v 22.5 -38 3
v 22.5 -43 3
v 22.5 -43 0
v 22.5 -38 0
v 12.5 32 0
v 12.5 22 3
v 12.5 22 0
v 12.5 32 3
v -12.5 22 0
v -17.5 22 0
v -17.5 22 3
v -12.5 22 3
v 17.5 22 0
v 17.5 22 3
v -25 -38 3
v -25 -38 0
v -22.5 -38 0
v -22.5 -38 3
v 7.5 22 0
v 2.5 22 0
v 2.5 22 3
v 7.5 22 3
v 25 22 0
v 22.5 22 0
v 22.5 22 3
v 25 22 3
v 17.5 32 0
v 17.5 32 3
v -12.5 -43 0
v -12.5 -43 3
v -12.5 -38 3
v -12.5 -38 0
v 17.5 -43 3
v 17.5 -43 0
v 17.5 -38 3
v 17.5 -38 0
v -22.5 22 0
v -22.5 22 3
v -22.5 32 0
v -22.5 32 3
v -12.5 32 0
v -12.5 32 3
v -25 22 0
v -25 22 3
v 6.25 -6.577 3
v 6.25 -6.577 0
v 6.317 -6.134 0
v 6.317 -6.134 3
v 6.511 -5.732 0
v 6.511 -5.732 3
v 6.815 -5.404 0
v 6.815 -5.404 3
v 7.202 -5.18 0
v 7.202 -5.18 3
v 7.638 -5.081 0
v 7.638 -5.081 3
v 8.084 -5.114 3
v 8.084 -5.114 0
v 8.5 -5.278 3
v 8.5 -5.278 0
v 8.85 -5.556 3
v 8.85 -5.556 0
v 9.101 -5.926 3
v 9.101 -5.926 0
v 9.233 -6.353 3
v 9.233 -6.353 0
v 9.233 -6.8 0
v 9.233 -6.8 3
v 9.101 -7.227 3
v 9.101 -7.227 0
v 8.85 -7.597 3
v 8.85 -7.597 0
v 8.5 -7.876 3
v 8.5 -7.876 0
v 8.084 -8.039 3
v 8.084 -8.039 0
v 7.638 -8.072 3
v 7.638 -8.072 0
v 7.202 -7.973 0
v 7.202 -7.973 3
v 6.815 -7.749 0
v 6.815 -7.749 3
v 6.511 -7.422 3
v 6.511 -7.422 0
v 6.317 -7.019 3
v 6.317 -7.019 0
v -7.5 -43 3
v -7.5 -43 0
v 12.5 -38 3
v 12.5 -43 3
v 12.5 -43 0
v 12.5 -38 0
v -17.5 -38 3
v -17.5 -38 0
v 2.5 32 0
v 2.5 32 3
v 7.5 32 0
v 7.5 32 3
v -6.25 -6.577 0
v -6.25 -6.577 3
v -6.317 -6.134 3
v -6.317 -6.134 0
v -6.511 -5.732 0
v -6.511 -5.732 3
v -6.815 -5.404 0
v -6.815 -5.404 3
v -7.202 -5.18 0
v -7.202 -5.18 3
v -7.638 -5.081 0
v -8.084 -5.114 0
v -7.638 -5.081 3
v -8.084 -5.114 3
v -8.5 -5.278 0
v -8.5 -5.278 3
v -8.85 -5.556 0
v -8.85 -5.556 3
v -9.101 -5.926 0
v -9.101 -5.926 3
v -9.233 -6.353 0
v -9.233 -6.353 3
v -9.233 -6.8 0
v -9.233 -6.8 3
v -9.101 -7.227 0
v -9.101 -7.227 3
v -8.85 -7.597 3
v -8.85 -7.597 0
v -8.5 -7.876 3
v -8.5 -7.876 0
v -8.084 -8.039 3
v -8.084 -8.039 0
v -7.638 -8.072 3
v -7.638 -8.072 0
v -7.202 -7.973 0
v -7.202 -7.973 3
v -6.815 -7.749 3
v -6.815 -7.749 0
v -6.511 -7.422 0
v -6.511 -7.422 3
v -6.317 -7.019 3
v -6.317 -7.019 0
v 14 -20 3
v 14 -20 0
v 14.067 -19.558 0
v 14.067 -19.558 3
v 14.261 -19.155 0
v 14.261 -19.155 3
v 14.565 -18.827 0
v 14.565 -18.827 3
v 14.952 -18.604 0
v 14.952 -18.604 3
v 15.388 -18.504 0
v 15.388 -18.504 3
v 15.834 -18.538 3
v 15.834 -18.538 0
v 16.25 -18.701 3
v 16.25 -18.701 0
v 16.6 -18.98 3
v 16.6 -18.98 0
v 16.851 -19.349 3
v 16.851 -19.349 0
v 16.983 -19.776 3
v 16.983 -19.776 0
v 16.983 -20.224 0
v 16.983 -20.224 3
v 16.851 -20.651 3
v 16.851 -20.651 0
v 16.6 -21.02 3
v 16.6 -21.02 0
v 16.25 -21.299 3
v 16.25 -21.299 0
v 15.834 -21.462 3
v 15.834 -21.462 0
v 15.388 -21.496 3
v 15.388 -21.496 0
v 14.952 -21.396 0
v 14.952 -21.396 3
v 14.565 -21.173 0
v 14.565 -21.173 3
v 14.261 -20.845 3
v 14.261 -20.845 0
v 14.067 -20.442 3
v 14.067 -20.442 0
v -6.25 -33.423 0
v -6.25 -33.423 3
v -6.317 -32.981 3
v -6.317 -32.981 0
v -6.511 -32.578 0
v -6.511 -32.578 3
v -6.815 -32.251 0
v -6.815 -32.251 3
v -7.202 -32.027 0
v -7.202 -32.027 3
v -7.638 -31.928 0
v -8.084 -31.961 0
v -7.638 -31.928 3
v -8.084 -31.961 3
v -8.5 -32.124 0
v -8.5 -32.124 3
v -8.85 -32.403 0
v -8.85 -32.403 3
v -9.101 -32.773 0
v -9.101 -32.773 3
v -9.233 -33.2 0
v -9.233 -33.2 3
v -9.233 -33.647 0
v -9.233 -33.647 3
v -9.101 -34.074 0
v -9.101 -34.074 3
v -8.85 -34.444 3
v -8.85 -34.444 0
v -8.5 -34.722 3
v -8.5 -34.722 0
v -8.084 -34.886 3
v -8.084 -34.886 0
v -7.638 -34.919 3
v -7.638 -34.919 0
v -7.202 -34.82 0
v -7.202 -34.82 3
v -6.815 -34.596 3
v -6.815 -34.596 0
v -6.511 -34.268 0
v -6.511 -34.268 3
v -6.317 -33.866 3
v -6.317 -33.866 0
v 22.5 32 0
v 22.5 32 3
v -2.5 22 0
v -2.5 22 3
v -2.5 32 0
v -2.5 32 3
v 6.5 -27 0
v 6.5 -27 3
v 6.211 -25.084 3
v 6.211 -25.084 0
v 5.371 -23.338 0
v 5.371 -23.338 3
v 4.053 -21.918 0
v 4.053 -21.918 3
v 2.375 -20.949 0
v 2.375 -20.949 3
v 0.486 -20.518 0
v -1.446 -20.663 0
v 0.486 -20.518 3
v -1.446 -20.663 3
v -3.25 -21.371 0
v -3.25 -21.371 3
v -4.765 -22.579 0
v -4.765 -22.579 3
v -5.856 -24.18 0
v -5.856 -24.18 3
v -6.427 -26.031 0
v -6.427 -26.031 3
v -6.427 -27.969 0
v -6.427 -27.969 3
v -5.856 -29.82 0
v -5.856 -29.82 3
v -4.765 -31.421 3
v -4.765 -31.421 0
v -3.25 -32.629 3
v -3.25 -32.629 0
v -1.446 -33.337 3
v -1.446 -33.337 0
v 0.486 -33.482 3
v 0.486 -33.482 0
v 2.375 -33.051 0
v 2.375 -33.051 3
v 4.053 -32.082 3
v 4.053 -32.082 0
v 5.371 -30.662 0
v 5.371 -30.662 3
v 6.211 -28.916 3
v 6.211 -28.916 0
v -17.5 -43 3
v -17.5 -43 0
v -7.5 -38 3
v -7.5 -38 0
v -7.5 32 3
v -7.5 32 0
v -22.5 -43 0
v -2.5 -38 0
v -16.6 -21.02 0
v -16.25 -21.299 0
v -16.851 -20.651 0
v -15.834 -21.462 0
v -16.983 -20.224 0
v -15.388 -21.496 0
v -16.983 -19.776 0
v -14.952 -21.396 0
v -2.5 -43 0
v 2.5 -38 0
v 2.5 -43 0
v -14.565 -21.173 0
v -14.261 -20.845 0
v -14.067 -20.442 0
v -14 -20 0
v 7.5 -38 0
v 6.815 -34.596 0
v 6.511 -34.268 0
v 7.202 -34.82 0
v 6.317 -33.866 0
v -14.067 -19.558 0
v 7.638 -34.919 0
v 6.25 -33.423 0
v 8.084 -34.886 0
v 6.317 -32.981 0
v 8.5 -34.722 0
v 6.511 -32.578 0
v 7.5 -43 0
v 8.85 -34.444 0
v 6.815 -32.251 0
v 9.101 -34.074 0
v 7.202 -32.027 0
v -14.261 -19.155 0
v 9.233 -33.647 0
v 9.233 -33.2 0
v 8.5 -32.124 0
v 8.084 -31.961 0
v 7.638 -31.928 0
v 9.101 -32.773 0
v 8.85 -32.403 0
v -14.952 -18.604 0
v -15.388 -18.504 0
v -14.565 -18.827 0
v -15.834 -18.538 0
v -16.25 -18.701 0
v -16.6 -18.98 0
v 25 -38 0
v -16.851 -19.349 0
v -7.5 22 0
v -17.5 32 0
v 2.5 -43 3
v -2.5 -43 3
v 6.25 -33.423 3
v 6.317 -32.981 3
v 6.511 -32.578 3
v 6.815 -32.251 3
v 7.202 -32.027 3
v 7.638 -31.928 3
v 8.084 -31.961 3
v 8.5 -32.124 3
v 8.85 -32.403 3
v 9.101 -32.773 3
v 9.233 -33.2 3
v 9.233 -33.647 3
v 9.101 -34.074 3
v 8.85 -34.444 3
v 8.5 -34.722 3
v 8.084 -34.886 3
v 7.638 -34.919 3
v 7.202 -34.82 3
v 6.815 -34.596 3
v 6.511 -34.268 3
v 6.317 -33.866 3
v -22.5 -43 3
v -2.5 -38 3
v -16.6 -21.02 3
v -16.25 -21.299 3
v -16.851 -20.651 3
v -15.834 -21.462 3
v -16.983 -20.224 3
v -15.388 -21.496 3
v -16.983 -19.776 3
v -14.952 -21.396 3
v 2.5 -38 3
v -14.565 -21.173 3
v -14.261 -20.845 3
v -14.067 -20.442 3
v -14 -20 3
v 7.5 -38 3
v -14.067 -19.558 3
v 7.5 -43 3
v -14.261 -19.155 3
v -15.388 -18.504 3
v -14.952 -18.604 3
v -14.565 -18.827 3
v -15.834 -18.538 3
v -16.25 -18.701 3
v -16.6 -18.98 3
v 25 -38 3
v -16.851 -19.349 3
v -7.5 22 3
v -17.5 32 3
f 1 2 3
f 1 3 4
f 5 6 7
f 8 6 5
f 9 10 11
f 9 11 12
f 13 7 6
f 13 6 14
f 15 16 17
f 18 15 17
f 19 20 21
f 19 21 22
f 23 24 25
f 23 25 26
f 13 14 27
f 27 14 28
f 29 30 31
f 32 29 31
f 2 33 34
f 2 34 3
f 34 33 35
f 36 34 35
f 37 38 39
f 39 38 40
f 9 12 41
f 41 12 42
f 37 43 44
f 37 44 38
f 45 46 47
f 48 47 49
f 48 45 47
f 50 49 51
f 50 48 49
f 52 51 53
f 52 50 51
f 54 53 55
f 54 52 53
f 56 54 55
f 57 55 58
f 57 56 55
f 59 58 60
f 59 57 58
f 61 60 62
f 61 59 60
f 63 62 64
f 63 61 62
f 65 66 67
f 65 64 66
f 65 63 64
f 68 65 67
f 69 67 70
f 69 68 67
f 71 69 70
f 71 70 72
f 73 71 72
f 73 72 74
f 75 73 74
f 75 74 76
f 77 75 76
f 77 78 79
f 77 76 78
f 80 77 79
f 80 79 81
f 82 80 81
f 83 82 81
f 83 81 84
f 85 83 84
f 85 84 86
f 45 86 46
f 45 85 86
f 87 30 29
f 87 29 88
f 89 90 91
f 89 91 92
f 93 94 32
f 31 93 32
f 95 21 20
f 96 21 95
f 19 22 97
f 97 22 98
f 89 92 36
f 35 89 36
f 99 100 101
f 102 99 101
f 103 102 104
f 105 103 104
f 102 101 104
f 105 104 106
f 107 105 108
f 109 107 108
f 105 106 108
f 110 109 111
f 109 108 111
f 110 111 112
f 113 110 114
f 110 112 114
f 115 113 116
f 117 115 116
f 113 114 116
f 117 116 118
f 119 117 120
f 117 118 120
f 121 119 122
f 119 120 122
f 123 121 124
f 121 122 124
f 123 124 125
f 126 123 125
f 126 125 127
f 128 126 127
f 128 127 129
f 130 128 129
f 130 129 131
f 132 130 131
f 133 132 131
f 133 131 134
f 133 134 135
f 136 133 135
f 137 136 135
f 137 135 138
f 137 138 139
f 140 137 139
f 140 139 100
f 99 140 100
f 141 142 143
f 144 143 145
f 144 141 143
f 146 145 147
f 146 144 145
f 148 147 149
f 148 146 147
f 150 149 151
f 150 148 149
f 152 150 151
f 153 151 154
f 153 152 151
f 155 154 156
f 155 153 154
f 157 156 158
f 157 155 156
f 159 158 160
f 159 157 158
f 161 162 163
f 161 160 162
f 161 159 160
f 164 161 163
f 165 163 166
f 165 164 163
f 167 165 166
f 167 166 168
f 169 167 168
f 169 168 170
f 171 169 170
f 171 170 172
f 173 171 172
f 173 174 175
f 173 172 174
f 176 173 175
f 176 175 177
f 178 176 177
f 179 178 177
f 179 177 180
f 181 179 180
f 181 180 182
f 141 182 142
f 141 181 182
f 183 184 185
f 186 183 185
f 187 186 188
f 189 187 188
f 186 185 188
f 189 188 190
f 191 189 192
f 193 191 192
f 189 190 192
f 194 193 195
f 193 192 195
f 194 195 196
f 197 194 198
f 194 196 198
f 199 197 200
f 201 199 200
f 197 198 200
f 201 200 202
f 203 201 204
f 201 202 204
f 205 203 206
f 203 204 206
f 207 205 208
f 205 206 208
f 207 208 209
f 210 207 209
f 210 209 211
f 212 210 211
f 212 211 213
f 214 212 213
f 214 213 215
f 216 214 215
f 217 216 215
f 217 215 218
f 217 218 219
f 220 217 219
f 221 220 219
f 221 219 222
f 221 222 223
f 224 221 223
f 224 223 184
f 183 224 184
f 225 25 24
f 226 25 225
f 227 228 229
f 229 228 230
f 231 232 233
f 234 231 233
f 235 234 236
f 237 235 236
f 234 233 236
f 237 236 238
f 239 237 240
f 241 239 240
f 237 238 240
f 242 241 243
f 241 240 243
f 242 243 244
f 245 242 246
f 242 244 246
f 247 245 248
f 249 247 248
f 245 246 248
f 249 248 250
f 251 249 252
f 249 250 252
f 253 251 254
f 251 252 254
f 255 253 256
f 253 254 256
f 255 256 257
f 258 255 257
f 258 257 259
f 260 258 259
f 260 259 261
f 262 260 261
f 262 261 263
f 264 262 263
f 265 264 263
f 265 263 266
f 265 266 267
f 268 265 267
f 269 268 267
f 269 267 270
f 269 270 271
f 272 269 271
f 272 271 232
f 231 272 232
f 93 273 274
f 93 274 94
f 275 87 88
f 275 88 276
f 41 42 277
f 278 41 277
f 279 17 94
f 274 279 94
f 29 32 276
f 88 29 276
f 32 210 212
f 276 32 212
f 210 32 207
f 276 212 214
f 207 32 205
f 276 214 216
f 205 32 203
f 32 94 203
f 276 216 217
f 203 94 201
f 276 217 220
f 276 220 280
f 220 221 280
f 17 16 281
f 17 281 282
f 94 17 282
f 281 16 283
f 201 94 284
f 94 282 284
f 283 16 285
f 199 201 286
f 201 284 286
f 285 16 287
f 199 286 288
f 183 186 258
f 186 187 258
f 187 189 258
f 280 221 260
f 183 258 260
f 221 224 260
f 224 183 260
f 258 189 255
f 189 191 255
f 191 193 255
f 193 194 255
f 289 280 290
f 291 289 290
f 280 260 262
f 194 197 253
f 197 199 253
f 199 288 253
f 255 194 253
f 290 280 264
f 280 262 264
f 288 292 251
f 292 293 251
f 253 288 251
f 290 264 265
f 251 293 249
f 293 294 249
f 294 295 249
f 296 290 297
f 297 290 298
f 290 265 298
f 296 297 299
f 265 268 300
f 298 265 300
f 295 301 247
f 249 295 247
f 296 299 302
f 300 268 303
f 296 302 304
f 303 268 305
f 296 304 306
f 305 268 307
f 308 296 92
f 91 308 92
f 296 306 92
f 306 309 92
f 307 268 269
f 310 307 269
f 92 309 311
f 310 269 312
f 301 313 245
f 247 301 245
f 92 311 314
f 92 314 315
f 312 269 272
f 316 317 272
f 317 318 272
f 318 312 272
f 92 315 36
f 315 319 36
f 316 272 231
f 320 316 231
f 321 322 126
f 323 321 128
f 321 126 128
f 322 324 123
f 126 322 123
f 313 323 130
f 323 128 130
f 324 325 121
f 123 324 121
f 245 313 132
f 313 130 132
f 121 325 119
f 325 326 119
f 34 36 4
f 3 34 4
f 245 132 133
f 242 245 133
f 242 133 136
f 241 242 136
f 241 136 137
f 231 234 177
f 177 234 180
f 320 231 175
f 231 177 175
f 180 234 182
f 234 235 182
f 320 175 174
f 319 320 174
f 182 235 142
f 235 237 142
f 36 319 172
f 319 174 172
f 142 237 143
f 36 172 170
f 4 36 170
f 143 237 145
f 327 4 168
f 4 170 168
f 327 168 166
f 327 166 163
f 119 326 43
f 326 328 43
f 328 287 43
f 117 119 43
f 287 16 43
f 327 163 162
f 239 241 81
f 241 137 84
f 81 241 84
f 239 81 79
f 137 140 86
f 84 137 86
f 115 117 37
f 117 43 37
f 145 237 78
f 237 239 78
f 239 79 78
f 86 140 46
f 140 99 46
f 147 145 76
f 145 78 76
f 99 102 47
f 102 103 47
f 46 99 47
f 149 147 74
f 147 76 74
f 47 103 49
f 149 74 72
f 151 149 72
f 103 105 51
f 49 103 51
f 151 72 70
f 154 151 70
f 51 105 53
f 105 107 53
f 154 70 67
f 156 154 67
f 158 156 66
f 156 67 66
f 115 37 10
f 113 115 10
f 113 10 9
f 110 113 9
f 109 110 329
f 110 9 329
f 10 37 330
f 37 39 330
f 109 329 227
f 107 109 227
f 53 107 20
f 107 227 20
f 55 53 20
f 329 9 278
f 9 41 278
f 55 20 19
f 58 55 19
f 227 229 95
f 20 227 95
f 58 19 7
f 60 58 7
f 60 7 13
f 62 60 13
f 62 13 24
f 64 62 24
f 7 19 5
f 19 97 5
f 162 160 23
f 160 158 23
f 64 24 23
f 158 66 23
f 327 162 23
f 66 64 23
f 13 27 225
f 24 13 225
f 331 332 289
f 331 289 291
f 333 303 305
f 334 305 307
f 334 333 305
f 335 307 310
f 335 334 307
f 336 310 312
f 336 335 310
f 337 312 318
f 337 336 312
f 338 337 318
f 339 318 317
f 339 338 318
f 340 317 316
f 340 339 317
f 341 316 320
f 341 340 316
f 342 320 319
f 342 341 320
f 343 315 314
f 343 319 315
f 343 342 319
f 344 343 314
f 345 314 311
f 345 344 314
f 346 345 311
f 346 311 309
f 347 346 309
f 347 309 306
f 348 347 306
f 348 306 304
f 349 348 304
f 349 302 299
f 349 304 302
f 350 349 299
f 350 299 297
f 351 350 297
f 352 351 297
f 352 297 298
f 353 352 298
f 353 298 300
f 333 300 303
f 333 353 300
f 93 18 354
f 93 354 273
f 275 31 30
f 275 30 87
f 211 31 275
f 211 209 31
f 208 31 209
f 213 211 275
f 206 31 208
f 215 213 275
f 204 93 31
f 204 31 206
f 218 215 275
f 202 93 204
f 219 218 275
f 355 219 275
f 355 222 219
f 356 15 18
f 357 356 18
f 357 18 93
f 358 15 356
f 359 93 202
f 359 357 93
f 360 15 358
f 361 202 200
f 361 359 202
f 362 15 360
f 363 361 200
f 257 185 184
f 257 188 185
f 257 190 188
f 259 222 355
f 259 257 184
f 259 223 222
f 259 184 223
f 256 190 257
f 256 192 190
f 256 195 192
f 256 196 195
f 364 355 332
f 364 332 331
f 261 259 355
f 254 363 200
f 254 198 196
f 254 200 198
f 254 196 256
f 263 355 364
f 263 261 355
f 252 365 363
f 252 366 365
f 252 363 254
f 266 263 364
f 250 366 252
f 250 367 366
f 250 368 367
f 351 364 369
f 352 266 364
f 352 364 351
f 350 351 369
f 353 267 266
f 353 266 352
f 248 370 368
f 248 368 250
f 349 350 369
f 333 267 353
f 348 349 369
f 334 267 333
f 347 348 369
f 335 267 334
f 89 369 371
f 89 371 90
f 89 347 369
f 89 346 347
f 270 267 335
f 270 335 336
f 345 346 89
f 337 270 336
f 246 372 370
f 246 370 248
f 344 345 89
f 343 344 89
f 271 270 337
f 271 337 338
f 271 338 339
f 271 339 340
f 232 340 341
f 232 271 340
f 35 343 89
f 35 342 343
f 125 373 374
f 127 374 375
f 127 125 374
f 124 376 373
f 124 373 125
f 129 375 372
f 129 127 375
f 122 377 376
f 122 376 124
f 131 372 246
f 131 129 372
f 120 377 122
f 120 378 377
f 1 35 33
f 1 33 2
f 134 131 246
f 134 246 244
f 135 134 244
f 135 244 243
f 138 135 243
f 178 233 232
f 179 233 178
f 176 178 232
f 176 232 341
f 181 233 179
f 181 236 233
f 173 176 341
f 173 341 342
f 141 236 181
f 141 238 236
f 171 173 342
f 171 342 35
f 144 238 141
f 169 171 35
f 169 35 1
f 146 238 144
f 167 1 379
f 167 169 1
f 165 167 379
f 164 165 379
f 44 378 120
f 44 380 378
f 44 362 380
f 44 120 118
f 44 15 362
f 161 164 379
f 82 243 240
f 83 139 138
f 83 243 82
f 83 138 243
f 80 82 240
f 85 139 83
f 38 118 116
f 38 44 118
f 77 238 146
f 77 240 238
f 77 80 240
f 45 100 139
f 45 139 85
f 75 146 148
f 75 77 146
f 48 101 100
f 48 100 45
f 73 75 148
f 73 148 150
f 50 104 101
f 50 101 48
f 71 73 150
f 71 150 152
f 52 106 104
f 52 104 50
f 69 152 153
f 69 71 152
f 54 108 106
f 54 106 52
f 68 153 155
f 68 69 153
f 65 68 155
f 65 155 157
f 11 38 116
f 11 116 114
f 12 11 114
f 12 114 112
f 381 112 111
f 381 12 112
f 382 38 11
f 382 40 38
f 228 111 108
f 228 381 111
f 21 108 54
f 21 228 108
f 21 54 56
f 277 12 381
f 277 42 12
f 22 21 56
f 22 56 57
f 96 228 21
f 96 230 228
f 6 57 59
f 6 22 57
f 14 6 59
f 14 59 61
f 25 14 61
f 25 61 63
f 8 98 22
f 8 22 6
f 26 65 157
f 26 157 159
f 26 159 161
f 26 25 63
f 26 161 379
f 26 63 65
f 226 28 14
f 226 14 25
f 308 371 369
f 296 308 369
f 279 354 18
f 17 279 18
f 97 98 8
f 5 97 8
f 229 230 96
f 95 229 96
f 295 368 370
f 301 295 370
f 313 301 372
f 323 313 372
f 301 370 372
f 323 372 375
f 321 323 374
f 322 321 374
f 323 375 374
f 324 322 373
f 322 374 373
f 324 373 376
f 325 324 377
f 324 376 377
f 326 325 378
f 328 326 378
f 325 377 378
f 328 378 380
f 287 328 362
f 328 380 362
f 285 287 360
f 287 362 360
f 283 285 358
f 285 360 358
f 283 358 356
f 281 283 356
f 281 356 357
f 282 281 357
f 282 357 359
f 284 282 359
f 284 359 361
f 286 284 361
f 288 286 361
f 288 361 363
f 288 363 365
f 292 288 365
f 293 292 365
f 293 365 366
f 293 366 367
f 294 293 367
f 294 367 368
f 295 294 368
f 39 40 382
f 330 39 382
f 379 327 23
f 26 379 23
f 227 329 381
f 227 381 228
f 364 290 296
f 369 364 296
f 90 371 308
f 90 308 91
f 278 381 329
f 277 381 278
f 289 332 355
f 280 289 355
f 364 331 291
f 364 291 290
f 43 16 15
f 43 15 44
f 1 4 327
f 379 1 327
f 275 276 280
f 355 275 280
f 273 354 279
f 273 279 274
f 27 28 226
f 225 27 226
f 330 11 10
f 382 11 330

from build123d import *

# Parameters (mm, degrees)
ESQUISSE3_W                = 50
ESQUISSE3_H                = 60
BOSS_EXTRU_12_DEPTH        = 3
ESQUISSE4_R                = 1.5
ENL_V_MAT_EXTRU_1_DEPTH    = 5
ESQUISSE6_R                = 6.5
ENL_V_MAT_EXTRU_3_DEPTH    = 10
ESQUISSE7_W                = 5
ESQUISSE7_H                = 10
ESQUISSE7_H_2              = 5
BOSS_EXTRU_13_DEPTH        = 3
R_P_TITION_LIN_AIRE1_COUNT = 5
R_P_TITION_LIN_AIRE1_PITCH = 10


with BuildPart() as part:
    # Esquisse3 → Boss.-Extru.12 (new body)
    with BuildSketch(Plane.XY):
        with Locations((0, -8)):
            Rectangle(ESQUISSE3_W, ESQUISSE3_H)
    extrude(amount=BOSS_EXTRU_12_DEPTH)

    # Esquisse4 → Enlèv. mat.-Extru.1 (cut)
    with BuildSketch(Plane.XY.offset(3)):
        with Locations((-7.75, -6.576606241)):
            Circle(ESQUISSE4_R)
        with Locations((-15.5, -20)):
            Circle(ESQUISSE4_R)
        with Locations((-7.75, -33.423393759)):
            Circle(ESQUISSE4_R)
    enl_v_mat_extru_1 = extrude(amount=-ENL_V_MAT_EXTRU_1_DEPTH, mode=Mode.SUBTRACT)

    # Esquisse6 → Enlèv. mat.-Extru.3 (cut)
    with BuildSketch(Plane.XY.offset(3)):
        with Locations((0, -27)):
            Circle(ESQUISSE6_R)
    extrude(amount=-ENL_V_MAT_EXTRU_3_DEPTH, mode=Mode.SUBTRACT)

    # Symétrie3: Enlèv. mat.-Extru.1 across plane
    add(enl_v_mat_extru_1.mirror(Plane(origin=(0, 0, 0), x_dir=(0, 0, 1), z_dir=(1, 0, 0))), mode=Mode.SUBTRACT)

    # Esquisse7 → Boss.-Extru.13 (add)
    with BuildSketch(Plane.XY.offset(3)):
        with Locations((-20, 27)):
            Rectangle(ESQUISSE7_W, ESQUISSE7_H)
        with Locations((-20, -40.5)):
            Rectangle(ESQUISSE7_W, ESQUISSE7_H_2)
    boss_extru_13 = extrude(amount=-BOSS_EXTRU_13_DEPTH)

    # Répétition linéaire1: Boss.-Extru.13 ×5
    with Locations(*[(i * R_P_TITION_LIN_AIRE1_PITCH, 0, 0) for i in range(1, R_P_TITION_LIN_AIRE1_COUNT)]):
        add(boss_extru_13)


solid = part.part
